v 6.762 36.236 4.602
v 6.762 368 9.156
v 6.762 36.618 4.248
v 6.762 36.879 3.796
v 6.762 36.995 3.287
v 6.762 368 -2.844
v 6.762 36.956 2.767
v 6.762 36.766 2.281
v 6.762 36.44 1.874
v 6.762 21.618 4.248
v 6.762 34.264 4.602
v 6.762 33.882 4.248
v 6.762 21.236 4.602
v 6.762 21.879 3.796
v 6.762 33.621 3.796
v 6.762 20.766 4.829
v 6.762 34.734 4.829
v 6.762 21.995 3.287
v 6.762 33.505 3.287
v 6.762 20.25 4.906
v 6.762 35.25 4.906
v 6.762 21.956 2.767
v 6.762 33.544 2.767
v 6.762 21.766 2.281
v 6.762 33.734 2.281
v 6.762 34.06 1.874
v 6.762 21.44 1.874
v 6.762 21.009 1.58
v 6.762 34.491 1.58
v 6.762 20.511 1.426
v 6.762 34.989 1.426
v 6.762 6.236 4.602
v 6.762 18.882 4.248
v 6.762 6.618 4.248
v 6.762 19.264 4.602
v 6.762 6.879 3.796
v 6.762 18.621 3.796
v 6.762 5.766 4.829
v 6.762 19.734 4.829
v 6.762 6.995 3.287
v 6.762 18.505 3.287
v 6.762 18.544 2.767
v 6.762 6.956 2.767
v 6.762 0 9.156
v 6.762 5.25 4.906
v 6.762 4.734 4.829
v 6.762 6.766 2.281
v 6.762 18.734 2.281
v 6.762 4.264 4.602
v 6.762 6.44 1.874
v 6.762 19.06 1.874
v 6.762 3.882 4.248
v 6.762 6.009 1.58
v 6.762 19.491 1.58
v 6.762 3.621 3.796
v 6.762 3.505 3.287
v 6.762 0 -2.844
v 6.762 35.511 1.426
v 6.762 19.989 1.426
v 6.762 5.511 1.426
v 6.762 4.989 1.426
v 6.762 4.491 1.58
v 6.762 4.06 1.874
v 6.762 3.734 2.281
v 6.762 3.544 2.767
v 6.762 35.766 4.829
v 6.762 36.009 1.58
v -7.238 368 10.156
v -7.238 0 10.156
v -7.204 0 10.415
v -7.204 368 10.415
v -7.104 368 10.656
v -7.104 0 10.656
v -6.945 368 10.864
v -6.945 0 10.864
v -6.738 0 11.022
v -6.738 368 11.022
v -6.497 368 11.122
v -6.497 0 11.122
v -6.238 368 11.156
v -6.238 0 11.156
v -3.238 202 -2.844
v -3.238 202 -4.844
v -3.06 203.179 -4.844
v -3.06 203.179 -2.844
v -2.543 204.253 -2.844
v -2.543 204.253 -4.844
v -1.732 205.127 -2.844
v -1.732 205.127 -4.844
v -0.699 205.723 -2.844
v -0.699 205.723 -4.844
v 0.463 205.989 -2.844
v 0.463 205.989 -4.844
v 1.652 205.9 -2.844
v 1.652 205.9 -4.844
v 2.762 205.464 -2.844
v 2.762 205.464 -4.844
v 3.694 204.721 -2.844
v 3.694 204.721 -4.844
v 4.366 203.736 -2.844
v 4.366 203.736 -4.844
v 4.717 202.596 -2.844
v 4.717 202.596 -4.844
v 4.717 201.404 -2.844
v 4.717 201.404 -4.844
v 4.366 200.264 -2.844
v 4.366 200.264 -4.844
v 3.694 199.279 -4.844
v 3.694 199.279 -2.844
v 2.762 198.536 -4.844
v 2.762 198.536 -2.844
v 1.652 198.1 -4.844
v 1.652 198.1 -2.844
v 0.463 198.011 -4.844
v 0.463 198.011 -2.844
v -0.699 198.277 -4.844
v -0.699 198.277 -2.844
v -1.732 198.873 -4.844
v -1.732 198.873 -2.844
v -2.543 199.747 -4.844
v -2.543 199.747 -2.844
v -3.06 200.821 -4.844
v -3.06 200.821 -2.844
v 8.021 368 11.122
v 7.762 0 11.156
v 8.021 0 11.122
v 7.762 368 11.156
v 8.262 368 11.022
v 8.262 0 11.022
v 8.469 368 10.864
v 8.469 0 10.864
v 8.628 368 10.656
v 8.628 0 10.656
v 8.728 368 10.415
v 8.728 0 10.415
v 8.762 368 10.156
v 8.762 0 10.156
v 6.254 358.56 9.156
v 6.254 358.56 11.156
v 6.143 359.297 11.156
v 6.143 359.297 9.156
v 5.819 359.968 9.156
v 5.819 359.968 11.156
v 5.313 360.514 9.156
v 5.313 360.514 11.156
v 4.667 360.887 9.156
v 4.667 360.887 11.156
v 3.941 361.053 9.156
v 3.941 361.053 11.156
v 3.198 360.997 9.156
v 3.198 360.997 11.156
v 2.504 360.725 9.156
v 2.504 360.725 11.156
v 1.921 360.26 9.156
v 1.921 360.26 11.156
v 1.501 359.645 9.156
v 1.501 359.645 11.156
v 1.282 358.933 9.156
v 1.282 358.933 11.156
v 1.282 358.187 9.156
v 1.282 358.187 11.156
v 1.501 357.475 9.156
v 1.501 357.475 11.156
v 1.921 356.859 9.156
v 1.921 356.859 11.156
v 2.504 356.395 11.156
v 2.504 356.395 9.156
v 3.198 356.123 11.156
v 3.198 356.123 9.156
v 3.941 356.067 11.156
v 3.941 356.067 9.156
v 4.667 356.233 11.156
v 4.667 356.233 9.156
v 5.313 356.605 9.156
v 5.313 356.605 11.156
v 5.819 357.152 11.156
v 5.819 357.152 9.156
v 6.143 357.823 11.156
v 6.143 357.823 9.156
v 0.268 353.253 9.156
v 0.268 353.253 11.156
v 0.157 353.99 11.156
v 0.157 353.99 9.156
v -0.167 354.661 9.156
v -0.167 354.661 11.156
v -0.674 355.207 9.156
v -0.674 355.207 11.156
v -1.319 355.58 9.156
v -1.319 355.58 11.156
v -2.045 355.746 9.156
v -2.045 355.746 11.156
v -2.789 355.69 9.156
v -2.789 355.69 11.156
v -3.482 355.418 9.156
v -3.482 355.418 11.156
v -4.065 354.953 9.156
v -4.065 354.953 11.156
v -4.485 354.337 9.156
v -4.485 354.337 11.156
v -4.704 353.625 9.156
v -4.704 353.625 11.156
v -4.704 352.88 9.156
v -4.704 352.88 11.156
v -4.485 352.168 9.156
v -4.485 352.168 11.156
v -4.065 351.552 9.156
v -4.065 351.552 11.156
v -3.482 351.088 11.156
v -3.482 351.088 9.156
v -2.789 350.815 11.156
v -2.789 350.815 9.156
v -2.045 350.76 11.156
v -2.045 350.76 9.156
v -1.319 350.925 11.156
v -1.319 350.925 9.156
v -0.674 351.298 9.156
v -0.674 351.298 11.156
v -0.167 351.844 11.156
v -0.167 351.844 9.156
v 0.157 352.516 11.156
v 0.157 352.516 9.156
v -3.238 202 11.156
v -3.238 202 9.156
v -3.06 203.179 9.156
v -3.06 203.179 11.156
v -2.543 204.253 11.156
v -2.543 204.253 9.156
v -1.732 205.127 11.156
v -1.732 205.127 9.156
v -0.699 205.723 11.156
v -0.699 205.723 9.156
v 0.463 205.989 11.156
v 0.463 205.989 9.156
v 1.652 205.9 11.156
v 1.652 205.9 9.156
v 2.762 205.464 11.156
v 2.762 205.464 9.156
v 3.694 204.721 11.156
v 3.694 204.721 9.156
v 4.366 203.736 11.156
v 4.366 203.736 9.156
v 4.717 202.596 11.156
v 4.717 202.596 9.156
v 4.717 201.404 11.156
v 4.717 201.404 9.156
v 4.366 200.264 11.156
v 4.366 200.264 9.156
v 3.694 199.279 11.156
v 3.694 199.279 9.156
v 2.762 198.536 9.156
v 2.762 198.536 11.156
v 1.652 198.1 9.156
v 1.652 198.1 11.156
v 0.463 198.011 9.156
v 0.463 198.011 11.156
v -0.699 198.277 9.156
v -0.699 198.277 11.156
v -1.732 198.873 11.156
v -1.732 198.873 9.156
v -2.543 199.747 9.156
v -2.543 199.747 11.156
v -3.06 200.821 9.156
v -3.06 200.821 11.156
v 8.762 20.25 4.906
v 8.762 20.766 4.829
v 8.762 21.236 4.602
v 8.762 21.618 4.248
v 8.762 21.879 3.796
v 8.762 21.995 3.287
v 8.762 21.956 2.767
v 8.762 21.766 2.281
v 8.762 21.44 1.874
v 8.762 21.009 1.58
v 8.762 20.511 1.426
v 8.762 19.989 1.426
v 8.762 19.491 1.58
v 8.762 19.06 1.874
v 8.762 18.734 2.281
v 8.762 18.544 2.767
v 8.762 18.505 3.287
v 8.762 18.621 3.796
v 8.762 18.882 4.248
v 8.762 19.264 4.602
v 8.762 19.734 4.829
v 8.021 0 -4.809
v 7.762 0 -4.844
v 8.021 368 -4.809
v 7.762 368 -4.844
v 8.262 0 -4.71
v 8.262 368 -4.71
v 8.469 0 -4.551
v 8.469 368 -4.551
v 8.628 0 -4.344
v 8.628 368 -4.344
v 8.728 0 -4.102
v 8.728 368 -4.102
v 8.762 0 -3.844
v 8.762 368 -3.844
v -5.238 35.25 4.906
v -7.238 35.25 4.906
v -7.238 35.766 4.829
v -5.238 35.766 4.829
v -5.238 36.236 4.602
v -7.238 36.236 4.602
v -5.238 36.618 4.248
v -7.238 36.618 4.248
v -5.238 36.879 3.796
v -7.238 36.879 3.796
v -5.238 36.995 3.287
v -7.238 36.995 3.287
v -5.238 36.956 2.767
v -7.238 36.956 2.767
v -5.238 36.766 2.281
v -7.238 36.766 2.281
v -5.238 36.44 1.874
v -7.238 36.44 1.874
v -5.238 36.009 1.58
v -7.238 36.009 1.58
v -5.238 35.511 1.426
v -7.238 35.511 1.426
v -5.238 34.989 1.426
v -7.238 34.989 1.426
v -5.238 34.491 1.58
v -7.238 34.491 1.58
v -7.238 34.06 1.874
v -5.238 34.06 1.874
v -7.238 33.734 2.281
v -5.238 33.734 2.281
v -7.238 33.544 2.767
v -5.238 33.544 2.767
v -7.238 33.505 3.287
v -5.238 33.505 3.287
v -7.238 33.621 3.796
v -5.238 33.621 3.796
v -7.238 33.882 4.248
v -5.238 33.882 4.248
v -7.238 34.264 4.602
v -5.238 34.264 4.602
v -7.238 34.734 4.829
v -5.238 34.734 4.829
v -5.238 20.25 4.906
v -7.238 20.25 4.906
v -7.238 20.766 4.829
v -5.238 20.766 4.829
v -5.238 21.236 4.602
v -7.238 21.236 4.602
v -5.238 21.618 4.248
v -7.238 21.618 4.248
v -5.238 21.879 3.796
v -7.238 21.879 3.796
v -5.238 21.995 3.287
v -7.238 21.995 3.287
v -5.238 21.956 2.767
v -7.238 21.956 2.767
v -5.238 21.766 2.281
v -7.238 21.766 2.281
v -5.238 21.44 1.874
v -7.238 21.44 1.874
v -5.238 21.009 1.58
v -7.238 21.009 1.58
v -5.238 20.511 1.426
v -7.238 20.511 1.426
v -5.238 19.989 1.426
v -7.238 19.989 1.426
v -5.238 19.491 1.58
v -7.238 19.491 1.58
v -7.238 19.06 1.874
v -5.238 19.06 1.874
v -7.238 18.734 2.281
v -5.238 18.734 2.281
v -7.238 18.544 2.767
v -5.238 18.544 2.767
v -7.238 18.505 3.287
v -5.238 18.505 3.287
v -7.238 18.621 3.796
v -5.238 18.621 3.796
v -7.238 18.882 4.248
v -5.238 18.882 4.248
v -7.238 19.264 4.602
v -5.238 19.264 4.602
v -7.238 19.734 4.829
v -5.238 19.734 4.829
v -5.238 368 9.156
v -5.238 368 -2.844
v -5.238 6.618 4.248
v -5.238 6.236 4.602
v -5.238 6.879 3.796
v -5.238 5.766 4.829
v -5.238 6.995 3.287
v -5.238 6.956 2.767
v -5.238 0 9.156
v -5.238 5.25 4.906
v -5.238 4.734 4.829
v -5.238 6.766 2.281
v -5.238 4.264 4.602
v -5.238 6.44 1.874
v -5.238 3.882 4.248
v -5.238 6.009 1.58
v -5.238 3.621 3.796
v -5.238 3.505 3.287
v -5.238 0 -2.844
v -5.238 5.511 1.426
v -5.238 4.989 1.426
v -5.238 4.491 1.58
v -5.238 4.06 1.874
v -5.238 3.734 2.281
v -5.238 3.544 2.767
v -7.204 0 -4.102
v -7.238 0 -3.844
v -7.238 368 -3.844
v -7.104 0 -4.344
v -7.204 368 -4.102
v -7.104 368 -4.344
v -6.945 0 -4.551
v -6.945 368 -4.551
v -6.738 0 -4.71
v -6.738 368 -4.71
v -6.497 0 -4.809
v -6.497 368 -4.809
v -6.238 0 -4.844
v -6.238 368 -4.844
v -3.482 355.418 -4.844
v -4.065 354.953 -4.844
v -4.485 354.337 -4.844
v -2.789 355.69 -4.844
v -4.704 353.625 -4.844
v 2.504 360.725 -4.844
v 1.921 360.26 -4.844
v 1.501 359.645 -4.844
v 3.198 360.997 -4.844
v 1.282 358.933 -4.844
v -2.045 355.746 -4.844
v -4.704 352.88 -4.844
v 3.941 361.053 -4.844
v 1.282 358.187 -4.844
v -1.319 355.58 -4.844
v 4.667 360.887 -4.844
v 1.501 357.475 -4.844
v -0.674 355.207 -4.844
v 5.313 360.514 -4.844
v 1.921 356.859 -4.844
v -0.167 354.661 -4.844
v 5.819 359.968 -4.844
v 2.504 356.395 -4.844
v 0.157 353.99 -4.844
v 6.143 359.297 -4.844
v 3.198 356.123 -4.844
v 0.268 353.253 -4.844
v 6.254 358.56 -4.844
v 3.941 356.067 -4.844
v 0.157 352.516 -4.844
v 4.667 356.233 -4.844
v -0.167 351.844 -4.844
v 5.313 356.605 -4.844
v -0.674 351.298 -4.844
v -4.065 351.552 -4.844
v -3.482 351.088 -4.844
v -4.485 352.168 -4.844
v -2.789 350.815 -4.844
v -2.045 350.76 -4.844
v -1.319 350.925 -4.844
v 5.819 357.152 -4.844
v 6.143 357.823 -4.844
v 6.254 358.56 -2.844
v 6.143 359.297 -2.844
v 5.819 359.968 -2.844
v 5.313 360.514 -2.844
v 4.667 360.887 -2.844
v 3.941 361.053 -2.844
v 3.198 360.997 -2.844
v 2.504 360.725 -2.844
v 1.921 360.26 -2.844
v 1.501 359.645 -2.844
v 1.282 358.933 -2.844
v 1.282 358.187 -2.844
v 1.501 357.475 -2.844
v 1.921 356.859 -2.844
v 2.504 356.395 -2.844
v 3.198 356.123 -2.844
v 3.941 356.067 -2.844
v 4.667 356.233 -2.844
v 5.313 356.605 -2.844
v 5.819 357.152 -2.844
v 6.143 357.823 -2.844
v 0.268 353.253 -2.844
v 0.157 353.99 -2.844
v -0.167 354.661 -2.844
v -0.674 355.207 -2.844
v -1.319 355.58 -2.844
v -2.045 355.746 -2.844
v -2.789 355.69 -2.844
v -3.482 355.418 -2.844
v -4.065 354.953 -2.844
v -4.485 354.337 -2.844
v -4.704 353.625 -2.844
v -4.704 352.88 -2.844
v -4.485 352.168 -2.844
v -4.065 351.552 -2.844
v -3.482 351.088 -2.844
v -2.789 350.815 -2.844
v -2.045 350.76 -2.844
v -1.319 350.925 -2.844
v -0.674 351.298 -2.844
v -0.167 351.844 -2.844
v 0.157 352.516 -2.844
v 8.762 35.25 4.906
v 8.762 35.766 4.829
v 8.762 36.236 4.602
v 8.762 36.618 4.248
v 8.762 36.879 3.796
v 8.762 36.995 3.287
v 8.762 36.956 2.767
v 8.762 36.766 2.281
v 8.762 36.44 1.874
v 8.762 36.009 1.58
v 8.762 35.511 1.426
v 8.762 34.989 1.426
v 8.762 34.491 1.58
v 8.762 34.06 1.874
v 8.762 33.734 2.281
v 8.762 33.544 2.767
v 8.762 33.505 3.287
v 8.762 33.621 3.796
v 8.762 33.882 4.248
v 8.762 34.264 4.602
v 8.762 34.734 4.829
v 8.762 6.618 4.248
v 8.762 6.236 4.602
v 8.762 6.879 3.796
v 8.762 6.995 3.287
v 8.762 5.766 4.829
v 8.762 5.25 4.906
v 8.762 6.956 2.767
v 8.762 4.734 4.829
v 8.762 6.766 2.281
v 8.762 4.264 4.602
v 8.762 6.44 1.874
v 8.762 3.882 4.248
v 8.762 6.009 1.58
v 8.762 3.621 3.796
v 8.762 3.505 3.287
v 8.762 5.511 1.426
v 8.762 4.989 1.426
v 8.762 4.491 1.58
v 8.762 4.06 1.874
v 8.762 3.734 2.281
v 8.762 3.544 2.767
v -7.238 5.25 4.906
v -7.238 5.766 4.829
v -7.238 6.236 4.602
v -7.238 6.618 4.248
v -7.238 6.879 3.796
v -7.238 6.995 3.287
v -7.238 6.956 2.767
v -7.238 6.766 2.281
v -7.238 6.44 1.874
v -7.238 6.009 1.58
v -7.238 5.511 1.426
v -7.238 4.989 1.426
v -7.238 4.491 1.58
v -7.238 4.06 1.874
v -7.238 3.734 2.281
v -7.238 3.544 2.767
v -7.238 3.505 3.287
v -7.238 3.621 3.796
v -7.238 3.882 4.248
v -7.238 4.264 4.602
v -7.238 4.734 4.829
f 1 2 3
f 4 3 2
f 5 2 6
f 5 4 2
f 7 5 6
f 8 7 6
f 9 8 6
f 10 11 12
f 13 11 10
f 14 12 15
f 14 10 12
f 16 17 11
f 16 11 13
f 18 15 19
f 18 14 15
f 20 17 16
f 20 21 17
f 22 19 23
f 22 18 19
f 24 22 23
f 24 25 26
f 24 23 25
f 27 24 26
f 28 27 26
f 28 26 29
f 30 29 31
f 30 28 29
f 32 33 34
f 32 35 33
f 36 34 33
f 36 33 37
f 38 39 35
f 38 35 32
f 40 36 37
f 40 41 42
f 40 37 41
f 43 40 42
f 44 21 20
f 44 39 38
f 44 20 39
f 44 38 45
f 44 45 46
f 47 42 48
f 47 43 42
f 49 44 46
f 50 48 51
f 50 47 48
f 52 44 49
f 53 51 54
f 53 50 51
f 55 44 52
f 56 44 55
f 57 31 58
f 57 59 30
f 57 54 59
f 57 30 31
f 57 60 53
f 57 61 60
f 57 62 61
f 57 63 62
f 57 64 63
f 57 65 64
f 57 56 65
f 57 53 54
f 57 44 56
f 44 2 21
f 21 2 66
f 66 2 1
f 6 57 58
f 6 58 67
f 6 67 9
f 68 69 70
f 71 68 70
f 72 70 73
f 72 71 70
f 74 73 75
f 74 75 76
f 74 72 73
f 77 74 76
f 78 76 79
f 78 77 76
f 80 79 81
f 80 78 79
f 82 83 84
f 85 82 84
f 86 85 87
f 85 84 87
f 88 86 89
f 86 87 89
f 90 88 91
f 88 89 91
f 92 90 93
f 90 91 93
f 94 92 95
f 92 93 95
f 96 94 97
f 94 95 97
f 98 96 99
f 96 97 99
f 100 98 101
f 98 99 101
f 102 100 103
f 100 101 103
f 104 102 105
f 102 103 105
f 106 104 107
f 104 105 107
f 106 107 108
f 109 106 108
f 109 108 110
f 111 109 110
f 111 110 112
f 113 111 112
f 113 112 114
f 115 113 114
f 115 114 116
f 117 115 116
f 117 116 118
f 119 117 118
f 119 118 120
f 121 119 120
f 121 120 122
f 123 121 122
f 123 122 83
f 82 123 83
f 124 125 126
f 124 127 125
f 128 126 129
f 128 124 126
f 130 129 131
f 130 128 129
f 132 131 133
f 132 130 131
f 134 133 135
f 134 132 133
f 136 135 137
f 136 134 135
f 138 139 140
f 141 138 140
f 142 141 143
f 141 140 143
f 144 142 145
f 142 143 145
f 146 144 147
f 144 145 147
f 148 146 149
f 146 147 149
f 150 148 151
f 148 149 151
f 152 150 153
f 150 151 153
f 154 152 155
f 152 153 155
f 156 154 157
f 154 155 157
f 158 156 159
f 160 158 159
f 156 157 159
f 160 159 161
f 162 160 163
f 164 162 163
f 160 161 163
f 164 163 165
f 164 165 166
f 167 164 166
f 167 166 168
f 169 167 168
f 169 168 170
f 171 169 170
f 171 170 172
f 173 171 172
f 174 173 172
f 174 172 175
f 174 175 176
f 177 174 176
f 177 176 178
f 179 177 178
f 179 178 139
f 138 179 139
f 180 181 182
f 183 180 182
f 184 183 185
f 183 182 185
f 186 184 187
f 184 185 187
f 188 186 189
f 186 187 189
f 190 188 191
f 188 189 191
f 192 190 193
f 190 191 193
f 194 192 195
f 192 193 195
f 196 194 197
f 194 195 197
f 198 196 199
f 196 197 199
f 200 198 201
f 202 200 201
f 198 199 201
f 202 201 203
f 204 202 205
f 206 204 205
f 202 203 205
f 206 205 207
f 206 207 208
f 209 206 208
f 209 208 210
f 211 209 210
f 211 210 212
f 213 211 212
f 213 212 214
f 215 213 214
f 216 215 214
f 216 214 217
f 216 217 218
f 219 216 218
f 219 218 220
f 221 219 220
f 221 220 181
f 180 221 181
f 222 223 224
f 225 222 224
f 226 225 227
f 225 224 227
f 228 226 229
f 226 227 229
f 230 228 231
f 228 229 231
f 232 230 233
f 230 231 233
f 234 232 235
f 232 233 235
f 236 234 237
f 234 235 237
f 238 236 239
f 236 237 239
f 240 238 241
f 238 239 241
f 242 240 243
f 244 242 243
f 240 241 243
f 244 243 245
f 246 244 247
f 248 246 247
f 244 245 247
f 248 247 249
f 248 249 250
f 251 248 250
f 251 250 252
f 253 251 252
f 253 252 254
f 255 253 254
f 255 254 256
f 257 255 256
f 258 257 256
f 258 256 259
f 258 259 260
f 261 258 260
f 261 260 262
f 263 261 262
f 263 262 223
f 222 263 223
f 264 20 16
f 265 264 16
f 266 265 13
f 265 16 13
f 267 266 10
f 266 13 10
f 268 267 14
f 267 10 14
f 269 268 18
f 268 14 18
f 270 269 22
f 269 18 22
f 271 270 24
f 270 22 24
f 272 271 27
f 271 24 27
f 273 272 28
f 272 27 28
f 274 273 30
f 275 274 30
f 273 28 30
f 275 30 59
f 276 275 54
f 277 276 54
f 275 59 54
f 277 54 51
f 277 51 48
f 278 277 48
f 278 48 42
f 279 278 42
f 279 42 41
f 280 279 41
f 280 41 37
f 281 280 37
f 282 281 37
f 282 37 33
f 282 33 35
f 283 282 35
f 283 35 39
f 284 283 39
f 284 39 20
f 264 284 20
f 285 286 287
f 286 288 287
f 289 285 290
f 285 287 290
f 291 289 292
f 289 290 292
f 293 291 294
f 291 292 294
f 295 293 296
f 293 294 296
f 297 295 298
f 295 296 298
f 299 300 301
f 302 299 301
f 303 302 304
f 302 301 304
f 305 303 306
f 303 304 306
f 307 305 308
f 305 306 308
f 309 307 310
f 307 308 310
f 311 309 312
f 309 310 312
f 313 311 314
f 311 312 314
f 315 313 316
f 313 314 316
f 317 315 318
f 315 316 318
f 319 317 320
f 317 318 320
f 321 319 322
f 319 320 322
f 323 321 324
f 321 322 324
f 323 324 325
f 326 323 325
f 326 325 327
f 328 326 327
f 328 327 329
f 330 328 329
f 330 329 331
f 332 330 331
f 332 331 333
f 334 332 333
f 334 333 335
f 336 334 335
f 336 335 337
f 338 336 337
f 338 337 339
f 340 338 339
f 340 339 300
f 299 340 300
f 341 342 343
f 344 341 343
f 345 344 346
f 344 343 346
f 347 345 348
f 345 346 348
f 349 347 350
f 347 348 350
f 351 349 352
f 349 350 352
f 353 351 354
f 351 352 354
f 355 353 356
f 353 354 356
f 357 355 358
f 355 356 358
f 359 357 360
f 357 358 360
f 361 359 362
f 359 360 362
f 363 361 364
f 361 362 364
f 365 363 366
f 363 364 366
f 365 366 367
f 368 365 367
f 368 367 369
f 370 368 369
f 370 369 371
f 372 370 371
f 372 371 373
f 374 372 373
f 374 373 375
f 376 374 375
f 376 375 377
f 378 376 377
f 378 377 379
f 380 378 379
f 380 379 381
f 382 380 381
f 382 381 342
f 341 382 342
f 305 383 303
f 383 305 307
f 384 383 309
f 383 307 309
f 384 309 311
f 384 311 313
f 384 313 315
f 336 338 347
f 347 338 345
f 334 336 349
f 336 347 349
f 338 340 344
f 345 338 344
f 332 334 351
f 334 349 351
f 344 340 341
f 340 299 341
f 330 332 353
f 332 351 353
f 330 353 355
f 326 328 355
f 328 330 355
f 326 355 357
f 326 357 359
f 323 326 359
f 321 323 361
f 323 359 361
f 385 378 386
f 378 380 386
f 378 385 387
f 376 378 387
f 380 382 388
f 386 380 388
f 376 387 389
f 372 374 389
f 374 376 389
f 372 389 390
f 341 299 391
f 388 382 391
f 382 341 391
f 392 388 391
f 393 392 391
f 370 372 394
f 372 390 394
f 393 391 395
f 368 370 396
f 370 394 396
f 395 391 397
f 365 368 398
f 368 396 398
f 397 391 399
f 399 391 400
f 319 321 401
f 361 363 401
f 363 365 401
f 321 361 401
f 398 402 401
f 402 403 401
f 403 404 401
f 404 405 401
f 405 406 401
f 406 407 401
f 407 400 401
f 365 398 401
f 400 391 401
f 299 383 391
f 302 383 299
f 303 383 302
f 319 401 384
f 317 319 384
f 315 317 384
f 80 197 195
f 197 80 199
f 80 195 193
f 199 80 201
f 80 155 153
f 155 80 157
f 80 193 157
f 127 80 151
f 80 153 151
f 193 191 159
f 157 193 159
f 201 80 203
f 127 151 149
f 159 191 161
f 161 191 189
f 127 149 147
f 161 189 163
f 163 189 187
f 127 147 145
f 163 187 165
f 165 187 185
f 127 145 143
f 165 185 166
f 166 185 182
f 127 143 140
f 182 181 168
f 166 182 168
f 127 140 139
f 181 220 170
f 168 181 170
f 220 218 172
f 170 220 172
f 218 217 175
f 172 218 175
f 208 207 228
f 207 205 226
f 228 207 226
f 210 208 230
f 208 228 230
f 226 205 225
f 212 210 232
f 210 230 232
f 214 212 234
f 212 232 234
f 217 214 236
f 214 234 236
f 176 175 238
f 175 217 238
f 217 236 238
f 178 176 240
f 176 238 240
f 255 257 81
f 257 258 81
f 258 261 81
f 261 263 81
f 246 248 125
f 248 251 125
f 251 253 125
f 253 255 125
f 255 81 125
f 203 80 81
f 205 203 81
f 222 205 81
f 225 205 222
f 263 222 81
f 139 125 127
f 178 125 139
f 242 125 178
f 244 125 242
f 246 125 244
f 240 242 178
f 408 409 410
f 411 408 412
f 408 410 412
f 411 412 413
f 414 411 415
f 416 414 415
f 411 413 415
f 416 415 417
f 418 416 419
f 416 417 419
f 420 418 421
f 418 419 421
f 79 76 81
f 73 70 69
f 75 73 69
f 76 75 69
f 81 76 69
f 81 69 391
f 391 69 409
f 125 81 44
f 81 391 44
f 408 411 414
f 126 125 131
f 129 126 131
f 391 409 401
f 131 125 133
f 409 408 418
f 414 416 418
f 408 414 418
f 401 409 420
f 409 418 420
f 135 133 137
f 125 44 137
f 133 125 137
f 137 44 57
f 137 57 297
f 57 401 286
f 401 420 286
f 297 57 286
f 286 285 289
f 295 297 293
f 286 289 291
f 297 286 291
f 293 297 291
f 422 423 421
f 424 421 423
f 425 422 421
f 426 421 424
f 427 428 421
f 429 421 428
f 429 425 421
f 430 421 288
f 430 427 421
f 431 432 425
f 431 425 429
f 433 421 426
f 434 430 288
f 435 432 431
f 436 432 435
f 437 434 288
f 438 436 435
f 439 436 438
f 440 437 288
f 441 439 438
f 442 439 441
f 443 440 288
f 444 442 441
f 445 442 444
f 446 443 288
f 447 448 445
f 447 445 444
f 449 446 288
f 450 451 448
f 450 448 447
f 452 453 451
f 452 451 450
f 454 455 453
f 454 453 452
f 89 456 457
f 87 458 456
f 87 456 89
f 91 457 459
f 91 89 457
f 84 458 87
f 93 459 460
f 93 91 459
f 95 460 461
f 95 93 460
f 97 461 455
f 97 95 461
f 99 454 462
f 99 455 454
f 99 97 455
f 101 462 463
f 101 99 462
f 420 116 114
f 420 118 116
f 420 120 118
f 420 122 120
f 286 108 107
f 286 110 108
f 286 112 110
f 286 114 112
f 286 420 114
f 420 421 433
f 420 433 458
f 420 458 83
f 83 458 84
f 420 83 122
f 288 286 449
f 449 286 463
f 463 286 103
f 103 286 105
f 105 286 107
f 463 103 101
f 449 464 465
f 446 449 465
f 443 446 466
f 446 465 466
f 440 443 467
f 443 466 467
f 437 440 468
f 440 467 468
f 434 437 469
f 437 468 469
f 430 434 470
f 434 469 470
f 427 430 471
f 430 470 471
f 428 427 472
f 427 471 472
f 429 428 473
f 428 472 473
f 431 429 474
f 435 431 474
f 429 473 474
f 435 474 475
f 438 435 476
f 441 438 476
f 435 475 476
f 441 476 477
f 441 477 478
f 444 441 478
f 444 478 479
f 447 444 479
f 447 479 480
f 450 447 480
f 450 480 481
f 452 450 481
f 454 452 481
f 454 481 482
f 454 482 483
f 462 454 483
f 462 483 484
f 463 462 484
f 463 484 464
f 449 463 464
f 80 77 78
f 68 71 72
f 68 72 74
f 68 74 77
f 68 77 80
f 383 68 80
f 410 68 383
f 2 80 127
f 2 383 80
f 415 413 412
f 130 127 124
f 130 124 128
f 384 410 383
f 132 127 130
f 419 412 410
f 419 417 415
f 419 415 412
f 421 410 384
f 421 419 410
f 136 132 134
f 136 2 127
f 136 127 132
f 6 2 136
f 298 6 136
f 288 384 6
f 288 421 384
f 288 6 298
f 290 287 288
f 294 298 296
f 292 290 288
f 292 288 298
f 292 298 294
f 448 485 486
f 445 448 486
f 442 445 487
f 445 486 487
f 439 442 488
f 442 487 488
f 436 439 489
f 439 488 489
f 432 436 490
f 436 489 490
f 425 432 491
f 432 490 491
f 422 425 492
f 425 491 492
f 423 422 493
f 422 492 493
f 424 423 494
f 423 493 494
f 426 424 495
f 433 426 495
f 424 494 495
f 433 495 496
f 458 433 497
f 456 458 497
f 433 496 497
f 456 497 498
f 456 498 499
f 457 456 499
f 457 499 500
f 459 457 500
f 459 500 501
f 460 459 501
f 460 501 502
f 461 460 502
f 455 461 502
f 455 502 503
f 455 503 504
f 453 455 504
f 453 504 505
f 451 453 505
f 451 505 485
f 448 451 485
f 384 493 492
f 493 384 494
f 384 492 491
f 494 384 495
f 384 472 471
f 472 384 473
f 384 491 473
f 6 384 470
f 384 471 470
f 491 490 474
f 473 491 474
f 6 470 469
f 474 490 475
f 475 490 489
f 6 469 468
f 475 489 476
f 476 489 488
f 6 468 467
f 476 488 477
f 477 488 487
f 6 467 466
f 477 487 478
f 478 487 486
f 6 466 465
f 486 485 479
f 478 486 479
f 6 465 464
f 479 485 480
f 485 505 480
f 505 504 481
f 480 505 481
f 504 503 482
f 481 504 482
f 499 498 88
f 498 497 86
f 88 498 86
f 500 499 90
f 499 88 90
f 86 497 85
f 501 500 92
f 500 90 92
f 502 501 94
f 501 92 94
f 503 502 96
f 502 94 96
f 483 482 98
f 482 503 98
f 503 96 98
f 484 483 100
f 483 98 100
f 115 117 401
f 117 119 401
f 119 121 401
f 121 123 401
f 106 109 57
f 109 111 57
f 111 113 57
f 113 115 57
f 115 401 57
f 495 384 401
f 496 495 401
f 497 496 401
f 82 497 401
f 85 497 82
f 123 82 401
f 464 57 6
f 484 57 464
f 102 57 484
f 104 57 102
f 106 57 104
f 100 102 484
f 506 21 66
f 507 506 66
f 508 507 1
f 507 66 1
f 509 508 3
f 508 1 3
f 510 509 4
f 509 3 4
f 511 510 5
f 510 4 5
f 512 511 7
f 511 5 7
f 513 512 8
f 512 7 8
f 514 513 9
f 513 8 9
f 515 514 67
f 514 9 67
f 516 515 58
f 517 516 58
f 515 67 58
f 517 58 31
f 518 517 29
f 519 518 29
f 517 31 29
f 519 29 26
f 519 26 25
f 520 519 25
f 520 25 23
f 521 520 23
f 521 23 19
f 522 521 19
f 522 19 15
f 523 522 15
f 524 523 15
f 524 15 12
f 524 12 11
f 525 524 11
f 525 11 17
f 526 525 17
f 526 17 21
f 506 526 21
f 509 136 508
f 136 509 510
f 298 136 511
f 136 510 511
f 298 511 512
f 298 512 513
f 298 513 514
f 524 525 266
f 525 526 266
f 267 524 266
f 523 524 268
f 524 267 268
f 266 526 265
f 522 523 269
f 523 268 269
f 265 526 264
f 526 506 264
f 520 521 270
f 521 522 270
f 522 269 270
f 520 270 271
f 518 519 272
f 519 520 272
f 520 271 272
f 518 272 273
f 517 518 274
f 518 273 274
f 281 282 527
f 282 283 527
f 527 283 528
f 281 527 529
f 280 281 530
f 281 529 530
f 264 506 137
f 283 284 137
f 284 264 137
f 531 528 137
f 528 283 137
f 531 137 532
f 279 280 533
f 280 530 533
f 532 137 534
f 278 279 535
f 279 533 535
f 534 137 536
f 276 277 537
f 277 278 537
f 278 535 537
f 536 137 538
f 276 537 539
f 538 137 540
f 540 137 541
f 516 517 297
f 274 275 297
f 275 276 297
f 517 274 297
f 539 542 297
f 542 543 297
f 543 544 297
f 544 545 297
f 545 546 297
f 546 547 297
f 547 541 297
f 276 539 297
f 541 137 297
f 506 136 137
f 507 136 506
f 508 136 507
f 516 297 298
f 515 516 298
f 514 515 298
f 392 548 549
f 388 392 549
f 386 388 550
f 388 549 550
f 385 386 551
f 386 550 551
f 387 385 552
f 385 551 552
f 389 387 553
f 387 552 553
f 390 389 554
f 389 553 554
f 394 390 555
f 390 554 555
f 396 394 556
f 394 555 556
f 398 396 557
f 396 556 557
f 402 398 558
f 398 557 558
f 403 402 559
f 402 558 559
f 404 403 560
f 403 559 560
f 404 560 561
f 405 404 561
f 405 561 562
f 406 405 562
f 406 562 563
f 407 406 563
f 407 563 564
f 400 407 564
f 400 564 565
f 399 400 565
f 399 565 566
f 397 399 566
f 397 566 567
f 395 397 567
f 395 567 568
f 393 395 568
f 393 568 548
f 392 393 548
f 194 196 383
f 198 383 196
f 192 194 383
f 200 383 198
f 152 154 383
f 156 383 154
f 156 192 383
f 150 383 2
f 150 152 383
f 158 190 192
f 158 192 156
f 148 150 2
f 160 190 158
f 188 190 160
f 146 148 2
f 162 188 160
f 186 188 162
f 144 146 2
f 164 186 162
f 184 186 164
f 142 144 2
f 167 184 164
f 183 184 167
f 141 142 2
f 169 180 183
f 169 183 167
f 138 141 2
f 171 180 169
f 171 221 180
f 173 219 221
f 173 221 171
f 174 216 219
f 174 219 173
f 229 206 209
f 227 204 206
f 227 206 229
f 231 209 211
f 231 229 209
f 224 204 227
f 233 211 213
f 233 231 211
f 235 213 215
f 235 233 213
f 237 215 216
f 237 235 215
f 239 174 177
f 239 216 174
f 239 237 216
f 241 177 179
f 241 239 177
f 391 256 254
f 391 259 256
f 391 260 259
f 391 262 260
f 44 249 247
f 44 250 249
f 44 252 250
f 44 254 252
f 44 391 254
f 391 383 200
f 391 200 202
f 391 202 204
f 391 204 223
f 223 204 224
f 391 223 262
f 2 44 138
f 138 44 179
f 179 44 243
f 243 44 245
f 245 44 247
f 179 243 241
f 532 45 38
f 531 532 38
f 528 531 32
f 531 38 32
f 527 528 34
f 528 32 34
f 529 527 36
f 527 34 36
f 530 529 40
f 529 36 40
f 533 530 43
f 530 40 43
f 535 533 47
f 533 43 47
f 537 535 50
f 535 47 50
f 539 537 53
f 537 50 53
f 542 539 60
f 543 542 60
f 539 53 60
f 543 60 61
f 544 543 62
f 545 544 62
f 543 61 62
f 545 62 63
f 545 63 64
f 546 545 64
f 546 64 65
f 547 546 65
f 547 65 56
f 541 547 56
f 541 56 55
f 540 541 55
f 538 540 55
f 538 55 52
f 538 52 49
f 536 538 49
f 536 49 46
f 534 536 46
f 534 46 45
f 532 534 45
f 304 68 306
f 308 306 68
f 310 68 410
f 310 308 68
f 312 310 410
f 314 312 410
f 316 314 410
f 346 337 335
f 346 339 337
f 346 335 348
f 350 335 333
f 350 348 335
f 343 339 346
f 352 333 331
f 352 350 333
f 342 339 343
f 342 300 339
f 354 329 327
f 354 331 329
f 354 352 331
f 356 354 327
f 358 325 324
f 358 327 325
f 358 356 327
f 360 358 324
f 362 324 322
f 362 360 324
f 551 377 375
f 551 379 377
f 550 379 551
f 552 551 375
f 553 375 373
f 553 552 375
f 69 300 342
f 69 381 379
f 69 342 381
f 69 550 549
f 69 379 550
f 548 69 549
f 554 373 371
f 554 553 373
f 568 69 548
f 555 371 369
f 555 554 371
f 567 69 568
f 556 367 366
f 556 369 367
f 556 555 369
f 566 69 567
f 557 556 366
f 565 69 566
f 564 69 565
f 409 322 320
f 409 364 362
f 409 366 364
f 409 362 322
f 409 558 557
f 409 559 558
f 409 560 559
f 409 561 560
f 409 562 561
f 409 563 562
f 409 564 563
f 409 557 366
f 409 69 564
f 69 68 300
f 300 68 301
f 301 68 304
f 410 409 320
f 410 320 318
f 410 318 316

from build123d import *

# Parameters (mm, degrees)
SKETCH1_W           = 16
SKETCH1_H           = 16
SKETCH1_W_2         = 12
SKETCH1_H_2         = 12
BOSS_EXTRUDE1_DEPTH = 368
FILLET1_R           = 1
SKETCH2_R           = 1.75
CUT_EXTRUDE1_DEPTH  = 16
SKETCH3_R           = 4
CUT_EXTRUDE2_DEPTH  = 16
SKETCH4_R           = 2.5
CUT_EXTRUDE3_DEPTH  = 20


with BuildPart() as part:
    # Sketch1 → Boss-Extrude1 (new body)
    with BuildSketch(Plane(origin=(0, 0, 0), x_dir=(1, 0, 0), z_dir=(0, 1, 0))):
        with Locations((0.761904762, -3.156462585)):
            Rectangle(SKETCH1_W, SKETCH1_H)
        with Locations((0.761904762, -3.156462585)):
            Rectangle(SKETCH1_W_2, SKETCH1_H_2, mode=Mode.SUBTRACT)
    extrude(amount=BOSS_EXTRUDE1_DEPTH)

    # Fillet1
    fillet1_edges = [part.edges().sort_by_distance(p)[0] for p in [
        (-7.238095238, 184, -4.843537415),
        (8.761904762, 184, -4.843537415),
        (8.761904762, 184, 11.156462585),
        (-7.238095238, 184, 11.156462585),
    ]]
    fillet(fillet1_edges, radius=FILLET1_R)

    # Sketch2 → Cut-Extrude1 (cut)
    with BuildSketch(Plane.ZY.offset(7.238095238)):
        with Locations((3.156462585, 5.25)):
            Circle(SKETCH2_R)
        with Locations((3.156462585, 20.25)):
            Circle(SKETCH2_R)
        with Locations((3.156462585, 35.25)):
            Circle(SKETCH2_R)
    extrude(amount=-CUT_EXTRUDE1_DEPTH, mode=Mode.SUBTRACT)

    # Sketch3 → Cut-Extrude2 (cut)
    with BuildSketch(Plane(origin=(0, 0, -4.843537415), x_dir=(-1, 0, 0), z_dir=(0, 0, -1))):
        with Locations((-0.761904762, 202)):
            Circle(SKETCH3_R)
    extrude(amount=-CUT_EXTRUDE2_DEPTH, mode=Mode.SUBTRACT)

    # Sketch4 → Cut-Extrude3 (cut)
    with BuildSketch(Plane.XY.offset(11.156462585)):
        with Locations((-2.232226364, 353.25267067)):
            Circle(SKETCH4_R)
        with Locations((3.753864965, 358.559902585)):
            Circle(SKETCH4_R)
    extrude(amount=-CUT_EXTRUDE3_DEPTH, mode=Mode.SUBTRACT)


solid = part.part
